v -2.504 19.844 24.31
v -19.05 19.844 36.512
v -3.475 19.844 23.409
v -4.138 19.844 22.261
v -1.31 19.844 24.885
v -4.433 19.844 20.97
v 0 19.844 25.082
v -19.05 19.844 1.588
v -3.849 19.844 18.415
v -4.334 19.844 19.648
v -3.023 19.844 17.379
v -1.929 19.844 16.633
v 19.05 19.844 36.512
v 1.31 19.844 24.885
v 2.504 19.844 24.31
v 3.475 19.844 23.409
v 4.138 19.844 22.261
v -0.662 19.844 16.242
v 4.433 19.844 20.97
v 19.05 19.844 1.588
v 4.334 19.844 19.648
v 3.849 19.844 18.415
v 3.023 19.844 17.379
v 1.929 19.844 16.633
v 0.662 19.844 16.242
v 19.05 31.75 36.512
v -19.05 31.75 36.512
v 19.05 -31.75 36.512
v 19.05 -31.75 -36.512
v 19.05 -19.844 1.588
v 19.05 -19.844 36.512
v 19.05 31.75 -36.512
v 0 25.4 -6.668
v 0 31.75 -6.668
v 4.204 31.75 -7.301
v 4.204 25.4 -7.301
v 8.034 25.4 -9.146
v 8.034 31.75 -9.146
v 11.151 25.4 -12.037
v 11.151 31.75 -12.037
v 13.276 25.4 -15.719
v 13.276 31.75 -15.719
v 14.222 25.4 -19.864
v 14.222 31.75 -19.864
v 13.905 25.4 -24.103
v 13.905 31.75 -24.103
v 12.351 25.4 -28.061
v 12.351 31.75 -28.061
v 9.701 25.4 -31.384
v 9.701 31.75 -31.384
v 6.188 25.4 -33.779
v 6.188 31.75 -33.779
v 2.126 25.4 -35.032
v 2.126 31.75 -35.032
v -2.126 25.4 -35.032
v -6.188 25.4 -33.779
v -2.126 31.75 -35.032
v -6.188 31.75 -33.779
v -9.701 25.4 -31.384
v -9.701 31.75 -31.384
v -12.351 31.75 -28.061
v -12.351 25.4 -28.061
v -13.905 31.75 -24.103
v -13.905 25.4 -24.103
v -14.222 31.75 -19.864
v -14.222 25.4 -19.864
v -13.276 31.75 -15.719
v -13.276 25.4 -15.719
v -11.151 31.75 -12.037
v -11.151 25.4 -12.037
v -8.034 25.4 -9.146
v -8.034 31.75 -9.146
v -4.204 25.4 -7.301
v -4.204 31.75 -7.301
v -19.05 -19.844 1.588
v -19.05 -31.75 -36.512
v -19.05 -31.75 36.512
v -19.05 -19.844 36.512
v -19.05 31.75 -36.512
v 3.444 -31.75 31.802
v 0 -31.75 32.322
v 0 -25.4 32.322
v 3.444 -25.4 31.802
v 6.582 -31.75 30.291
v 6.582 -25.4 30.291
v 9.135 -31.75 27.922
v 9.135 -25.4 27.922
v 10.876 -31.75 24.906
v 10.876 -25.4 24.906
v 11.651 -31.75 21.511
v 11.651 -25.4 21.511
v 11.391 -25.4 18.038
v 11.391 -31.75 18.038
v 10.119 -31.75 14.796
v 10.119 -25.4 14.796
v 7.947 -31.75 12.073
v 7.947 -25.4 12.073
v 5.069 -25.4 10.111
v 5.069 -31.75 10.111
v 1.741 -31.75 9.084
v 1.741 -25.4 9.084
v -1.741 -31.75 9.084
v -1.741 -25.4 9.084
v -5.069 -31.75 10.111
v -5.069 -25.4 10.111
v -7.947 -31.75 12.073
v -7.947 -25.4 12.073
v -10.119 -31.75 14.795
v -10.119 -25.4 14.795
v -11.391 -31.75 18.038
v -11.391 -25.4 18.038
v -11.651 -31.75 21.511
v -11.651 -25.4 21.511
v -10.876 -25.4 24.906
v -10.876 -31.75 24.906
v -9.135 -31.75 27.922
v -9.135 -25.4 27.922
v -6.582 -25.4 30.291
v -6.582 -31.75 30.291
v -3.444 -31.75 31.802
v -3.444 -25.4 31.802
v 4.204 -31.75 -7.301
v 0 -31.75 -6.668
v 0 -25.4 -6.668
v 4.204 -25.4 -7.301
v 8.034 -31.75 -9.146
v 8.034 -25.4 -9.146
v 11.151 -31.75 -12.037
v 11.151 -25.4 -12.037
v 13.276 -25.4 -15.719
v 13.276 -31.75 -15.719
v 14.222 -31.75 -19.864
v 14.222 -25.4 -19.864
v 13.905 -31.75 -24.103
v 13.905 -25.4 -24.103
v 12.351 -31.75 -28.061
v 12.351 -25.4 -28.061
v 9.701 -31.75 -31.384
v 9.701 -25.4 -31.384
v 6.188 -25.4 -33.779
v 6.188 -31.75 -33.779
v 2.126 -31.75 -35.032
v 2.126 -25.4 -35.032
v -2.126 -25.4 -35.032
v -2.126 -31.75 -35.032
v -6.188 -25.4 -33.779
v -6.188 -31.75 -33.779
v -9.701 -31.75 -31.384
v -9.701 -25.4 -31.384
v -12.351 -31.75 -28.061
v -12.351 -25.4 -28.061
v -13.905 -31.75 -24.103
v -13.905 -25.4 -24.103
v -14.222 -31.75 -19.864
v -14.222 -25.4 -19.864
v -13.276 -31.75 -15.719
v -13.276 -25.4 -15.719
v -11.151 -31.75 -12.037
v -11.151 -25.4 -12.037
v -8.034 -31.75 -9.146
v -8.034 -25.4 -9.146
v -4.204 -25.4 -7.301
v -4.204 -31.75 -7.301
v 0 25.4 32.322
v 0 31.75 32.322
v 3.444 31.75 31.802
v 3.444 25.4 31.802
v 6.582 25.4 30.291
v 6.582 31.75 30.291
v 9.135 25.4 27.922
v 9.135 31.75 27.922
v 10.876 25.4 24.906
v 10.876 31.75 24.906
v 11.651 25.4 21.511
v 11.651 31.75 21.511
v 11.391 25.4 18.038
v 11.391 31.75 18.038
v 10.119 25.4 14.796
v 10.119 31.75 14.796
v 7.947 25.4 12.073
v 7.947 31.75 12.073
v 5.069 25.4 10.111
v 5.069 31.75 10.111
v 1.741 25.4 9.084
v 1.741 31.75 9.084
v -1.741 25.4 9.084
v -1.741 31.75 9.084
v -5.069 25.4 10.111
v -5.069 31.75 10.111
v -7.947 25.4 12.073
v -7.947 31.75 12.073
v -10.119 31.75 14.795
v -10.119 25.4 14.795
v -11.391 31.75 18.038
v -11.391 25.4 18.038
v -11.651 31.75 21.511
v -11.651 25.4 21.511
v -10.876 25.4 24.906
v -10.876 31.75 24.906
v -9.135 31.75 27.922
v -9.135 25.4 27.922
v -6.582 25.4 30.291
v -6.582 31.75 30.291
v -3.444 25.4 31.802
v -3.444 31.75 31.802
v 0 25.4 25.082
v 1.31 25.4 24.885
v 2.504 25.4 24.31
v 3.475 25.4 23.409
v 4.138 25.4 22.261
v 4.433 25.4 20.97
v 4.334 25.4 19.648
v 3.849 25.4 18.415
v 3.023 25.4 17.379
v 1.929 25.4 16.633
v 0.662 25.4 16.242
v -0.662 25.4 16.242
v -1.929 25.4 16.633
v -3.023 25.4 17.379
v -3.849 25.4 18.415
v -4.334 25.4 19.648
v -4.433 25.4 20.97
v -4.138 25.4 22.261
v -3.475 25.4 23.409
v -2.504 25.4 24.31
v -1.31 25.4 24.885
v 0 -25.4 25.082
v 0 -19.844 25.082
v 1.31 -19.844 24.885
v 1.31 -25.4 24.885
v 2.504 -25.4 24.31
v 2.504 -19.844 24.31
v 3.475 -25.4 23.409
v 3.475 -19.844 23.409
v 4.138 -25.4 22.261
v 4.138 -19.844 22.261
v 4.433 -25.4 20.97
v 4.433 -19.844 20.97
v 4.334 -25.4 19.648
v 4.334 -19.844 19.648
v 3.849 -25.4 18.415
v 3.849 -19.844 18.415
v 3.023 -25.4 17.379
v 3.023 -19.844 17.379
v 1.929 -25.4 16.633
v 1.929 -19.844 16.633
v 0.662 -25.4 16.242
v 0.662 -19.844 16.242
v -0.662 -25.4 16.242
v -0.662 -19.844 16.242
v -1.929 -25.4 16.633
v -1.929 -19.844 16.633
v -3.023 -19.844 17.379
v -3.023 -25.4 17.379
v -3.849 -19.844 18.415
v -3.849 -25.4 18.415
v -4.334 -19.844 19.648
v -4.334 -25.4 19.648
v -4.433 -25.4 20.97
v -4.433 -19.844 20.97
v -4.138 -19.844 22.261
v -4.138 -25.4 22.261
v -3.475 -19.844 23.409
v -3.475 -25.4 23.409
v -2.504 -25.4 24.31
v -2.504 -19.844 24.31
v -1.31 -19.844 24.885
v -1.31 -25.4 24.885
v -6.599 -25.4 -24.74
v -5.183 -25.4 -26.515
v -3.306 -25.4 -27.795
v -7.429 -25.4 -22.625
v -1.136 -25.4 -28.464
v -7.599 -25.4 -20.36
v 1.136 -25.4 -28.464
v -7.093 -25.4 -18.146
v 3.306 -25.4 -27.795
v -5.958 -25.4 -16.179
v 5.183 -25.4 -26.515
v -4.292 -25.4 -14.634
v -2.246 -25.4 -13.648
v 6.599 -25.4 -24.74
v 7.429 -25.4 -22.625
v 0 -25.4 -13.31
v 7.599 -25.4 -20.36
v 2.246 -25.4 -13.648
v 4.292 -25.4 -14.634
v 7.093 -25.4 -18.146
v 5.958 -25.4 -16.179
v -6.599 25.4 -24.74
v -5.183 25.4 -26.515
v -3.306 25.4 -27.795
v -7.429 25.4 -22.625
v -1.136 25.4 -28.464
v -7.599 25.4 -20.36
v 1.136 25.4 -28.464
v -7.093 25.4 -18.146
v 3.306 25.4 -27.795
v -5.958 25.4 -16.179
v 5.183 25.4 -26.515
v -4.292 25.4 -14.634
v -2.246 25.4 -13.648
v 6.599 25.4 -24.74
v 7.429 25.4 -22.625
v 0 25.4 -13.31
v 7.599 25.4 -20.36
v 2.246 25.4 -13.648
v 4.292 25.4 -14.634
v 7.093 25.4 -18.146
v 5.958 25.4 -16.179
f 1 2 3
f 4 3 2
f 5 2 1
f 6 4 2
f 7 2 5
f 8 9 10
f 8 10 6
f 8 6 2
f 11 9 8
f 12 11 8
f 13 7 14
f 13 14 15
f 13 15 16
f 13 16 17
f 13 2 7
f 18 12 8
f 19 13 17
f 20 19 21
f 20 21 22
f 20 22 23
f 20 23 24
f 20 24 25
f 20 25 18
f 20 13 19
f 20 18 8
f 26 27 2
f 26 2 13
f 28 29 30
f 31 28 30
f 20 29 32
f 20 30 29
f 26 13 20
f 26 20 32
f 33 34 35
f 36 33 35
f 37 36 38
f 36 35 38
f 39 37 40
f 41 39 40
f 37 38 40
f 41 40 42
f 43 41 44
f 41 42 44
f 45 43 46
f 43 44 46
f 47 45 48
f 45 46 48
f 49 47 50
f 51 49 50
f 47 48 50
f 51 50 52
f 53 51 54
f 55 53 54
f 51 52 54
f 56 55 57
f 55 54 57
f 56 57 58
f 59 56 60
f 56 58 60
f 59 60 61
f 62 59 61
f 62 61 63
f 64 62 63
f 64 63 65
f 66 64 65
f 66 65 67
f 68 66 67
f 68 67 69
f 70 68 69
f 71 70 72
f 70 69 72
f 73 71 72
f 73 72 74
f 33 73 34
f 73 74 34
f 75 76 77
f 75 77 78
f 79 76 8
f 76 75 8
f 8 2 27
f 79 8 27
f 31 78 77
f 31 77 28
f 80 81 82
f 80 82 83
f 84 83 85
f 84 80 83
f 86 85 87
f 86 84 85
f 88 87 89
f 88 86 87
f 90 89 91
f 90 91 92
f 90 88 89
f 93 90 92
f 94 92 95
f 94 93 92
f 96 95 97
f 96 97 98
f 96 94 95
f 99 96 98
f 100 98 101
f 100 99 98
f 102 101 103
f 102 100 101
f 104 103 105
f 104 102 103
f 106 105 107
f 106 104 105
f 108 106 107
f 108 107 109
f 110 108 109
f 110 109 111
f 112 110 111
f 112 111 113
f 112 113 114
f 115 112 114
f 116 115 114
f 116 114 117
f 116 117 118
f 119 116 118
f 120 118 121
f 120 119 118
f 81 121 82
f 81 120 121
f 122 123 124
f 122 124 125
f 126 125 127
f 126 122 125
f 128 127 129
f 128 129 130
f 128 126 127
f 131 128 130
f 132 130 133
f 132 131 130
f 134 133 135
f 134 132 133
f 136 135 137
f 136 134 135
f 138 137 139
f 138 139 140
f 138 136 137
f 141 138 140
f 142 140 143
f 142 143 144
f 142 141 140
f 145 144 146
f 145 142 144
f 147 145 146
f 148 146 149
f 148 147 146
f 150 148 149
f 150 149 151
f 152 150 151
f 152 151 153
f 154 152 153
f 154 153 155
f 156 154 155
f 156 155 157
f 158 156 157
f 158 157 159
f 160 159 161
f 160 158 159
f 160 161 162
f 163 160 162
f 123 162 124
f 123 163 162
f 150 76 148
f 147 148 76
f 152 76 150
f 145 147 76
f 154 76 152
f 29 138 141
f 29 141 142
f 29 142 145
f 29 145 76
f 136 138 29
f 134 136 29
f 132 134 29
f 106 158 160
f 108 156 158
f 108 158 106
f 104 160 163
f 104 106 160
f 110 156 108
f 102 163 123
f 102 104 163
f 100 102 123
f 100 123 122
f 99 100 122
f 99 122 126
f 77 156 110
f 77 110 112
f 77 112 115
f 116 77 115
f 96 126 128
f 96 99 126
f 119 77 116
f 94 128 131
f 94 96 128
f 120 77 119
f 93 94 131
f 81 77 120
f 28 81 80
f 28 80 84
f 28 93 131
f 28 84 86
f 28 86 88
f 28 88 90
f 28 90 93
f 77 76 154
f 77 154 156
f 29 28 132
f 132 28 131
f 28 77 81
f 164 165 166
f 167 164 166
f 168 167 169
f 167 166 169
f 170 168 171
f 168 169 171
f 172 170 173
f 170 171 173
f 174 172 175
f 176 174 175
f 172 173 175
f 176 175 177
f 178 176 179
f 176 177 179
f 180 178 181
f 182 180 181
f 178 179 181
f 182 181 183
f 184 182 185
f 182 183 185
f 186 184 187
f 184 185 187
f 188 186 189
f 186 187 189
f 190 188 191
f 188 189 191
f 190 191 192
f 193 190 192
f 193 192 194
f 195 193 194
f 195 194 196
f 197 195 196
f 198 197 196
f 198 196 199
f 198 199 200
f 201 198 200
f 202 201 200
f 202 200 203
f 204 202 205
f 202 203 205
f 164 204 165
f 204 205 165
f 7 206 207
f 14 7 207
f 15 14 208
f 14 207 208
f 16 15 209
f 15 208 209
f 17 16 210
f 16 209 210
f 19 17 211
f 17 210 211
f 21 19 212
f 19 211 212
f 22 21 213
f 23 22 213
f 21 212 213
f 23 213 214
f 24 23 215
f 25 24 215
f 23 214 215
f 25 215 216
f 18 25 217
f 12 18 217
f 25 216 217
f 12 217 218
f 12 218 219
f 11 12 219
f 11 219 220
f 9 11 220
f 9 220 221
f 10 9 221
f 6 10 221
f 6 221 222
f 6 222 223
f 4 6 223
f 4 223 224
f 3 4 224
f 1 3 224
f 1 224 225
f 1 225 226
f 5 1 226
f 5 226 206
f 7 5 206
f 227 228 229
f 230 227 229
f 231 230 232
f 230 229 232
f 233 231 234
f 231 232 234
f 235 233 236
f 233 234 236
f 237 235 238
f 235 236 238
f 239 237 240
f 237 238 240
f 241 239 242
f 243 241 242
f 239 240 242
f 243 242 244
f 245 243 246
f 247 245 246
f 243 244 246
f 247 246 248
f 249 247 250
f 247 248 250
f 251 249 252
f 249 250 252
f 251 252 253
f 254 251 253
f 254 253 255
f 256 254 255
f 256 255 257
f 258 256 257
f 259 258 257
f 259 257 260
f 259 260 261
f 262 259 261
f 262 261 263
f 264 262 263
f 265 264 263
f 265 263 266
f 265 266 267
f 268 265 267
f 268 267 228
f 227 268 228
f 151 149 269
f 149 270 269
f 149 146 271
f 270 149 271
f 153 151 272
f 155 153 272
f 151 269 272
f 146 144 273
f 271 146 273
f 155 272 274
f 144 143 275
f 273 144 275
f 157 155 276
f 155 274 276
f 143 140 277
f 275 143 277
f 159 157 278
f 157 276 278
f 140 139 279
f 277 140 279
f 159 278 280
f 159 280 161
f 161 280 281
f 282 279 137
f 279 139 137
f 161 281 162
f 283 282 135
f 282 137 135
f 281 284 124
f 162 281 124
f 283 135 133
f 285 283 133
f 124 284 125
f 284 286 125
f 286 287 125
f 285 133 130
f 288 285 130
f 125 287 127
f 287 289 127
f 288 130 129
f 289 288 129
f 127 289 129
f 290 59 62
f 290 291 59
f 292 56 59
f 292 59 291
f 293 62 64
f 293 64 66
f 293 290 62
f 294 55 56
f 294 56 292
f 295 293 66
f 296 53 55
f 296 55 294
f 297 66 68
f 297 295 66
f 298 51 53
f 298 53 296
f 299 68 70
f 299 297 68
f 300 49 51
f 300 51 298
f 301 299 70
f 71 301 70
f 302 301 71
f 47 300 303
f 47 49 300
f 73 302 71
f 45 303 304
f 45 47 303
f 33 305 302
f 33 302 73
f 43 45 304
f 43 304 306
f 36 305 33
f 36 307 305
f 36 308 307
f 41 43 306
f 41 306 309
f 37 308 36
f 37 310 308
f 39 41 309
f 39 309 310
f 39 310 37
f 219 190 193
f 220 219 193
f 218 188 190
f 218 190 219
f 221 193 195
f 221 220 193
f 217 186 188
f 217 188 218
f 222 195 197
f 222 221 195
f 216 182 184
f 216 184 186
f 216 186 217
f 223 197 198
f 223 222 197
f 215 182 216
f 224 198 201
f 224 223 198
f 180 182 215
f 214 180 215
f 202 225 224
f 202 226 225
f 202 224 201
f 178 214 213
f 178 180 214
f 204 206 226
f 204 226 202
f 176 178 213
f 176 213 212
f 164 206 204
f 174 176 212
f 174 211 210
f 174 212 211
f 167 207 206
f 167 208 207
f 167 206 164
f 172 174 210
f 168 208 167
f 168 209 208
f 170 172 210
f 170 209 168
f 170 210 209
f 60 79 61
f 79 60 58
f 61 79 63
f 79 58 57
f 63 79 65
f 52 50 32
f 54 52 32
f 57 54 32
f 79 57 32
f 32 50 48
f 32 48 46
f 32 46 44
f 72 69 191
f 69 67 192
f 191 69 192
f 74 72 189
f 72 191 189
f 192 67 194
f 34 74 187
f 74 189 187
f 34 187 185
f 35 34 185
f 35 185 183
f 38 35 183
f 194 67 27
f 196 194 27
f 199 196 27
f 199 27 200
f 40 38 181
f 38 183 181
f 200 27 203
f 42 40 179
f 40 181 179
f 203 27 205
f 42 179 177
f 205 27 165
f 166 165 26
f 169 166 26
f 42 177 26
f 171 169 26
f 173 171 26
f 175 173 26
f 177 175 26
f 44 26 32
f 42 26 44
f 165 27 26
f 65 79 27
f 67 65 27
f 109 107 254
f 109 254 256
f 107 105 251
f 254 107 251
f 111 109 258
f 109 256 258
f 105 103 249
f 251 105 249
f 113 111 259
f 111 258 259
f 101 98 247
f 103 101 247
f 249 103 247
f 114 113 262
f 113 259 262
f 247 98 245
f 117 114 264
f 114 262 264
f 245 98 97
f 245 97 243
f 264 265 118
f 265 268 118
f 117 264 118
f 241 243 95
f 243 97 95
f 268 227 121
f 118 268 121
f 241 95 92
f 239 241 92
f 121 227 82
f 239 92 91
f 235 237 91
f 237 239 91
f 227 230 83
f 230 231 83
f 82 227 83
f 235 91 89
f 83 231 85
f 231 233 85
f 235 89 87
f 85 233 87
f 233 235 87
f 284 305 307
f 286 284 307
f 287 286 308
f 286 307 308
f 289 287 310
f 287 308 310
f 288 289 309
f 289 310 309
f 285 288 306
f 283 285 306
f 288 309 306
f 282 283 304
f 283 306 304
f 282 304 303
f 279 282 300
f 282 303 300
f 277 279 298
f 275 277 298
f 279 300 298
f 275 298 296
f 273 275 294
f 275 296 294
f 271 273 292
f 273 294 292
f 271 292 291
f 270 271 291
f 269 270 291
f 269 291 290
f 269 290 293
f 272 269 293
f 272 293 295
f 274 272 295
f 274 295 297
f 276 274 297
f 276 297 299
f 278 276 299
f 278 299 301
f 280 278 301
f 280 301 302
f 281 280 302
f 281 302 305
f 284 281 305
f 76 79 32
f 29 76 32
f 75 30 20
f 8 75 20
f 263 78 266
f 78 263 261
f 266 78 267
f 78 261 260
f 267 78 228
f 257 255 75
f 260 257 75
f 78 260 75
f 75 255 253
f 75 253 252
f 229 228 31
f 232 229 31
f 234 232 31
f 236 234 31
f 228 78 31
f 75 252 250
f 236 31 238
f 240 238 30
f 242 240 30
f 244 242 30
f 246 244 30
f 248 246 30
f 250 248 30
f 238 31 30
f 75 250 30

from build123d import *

# Parameters (mm, degrees)
SKETCH1_W           = 38.1
SKETCH1_H           = 63.5
BOSS_EXTRUDE1_DEPTH = 36.5125
SKETCH2_W           = 34.925
SKETCH2_H           = 39.6875
CUT_EXTRUDE1_DEPTH  = 62.585998054
SKETCH3_R           = 4.445
CUT_EXTRUDE2_DEPTH  = 76.685633751
SKETCH4_R           = 11.684
CUT_EXTRUDE3_DEPTH  = 6.35
SKETCH6_R           = 14.2621
CUT_EXTRUDE5_DEPTH  = 6.35
SKETCH7_R           = 7.62
CUT_EXTRUDE6_DEPTH  = 71.44279705


with BuildPart() as part:
    # Sketch1 → Boss-Extrude1 (new, symmetric)
    with BuildSketch(Plane.XY):
        Rectangle(SKETCH1_W, SKETCH1_H)
    extrude(amount=BOSS_EXTRUDE1_DEPTH, both=True)

    # Sketch2 → Cut-Extrude1 (cut, through all)
    with BuildSketch(Plane(origin=(19.05, 0, 0), x_dir=(0, 0, -1), z_dir=(1, 0, 0))):
        with Locations((-19.05, 0)):
            Rectangle(SKETCH2_W, SKETCH2_H)
    extrude(amount=-CUT_EXTRUDE1_DEPTH, mode=Mode.SUBTRACT)

    # Sketch3 → Cut-Extrude2 (cut, through all)
    with BuildSketch(Plane(origin=(0, 31.75, 0), x_dir=(1, 0, 0), z_dir=(0, 1, 0))):
        with Locations(Location((0, -20.6375, 0), (0, 0, 270))):
            Circle(SKETCH3_R)
    extrude(amount=-CUT_EXTRUDE2_DEPTH, mode=Mode.SUBTRACT)

    # Sketch4 → Cut-Extrude3 (cut)
    with BuildSketch(Plane(origin=(0, 31.75, 0), x_dir=(1, 0, 0), z_dir=(0, 1, 0))):
        with Locations(Location((0, -20.6375, 0), (0, 0, 270))):
            Circle(SKETCH4_R)
    cut_extrude3 = extrude(amount=-CUT_EXTRUDE3_DEPTH, mode=Mode.SUBTRACT)

    # Sketch6 → Cut-Extrude5 (cut)
    with BuildSketch(Plane(origin=(0, 31.75, 0), x_dir=(1, 0, 0), z_dir=(0, 1, 0))):
        with Locations(Location((0, 20.9296, 0), (0, 0, 270))):
            Circle(SKETCH6_R)
    cut_extrude5 = extrude(amount=-CUT_EXTRUDE5_DEPTH, mode=Mode.SUBTRACT)

    # Mirror1: Cut-Extrude3, Cut-Extrude5 across plane
    add(cut_extrude3.mirror(Plane.ZX), mode=Mode.SUBTRACT)
    add(cut_extrude5.mirror(Plane.ZX), mode=Mode.SUBTRACT)

    # Sketch7 → Cut-Extrude6 (cut, through all)
    with BuildSketch(Plane(origin=(0, 25.4, 0), x_dir=(1, 0, 0), z_dir=(0, 1, 0))):
        with Locations(Location((0, 20.9296, 0), (0, 0, 270))):
            Circle(SKETCH7_R)
    extrude(amount=-CUT_EXTRUDE6_DEPTH, mode=Mode.SUBTRACT)


solid = part.part
